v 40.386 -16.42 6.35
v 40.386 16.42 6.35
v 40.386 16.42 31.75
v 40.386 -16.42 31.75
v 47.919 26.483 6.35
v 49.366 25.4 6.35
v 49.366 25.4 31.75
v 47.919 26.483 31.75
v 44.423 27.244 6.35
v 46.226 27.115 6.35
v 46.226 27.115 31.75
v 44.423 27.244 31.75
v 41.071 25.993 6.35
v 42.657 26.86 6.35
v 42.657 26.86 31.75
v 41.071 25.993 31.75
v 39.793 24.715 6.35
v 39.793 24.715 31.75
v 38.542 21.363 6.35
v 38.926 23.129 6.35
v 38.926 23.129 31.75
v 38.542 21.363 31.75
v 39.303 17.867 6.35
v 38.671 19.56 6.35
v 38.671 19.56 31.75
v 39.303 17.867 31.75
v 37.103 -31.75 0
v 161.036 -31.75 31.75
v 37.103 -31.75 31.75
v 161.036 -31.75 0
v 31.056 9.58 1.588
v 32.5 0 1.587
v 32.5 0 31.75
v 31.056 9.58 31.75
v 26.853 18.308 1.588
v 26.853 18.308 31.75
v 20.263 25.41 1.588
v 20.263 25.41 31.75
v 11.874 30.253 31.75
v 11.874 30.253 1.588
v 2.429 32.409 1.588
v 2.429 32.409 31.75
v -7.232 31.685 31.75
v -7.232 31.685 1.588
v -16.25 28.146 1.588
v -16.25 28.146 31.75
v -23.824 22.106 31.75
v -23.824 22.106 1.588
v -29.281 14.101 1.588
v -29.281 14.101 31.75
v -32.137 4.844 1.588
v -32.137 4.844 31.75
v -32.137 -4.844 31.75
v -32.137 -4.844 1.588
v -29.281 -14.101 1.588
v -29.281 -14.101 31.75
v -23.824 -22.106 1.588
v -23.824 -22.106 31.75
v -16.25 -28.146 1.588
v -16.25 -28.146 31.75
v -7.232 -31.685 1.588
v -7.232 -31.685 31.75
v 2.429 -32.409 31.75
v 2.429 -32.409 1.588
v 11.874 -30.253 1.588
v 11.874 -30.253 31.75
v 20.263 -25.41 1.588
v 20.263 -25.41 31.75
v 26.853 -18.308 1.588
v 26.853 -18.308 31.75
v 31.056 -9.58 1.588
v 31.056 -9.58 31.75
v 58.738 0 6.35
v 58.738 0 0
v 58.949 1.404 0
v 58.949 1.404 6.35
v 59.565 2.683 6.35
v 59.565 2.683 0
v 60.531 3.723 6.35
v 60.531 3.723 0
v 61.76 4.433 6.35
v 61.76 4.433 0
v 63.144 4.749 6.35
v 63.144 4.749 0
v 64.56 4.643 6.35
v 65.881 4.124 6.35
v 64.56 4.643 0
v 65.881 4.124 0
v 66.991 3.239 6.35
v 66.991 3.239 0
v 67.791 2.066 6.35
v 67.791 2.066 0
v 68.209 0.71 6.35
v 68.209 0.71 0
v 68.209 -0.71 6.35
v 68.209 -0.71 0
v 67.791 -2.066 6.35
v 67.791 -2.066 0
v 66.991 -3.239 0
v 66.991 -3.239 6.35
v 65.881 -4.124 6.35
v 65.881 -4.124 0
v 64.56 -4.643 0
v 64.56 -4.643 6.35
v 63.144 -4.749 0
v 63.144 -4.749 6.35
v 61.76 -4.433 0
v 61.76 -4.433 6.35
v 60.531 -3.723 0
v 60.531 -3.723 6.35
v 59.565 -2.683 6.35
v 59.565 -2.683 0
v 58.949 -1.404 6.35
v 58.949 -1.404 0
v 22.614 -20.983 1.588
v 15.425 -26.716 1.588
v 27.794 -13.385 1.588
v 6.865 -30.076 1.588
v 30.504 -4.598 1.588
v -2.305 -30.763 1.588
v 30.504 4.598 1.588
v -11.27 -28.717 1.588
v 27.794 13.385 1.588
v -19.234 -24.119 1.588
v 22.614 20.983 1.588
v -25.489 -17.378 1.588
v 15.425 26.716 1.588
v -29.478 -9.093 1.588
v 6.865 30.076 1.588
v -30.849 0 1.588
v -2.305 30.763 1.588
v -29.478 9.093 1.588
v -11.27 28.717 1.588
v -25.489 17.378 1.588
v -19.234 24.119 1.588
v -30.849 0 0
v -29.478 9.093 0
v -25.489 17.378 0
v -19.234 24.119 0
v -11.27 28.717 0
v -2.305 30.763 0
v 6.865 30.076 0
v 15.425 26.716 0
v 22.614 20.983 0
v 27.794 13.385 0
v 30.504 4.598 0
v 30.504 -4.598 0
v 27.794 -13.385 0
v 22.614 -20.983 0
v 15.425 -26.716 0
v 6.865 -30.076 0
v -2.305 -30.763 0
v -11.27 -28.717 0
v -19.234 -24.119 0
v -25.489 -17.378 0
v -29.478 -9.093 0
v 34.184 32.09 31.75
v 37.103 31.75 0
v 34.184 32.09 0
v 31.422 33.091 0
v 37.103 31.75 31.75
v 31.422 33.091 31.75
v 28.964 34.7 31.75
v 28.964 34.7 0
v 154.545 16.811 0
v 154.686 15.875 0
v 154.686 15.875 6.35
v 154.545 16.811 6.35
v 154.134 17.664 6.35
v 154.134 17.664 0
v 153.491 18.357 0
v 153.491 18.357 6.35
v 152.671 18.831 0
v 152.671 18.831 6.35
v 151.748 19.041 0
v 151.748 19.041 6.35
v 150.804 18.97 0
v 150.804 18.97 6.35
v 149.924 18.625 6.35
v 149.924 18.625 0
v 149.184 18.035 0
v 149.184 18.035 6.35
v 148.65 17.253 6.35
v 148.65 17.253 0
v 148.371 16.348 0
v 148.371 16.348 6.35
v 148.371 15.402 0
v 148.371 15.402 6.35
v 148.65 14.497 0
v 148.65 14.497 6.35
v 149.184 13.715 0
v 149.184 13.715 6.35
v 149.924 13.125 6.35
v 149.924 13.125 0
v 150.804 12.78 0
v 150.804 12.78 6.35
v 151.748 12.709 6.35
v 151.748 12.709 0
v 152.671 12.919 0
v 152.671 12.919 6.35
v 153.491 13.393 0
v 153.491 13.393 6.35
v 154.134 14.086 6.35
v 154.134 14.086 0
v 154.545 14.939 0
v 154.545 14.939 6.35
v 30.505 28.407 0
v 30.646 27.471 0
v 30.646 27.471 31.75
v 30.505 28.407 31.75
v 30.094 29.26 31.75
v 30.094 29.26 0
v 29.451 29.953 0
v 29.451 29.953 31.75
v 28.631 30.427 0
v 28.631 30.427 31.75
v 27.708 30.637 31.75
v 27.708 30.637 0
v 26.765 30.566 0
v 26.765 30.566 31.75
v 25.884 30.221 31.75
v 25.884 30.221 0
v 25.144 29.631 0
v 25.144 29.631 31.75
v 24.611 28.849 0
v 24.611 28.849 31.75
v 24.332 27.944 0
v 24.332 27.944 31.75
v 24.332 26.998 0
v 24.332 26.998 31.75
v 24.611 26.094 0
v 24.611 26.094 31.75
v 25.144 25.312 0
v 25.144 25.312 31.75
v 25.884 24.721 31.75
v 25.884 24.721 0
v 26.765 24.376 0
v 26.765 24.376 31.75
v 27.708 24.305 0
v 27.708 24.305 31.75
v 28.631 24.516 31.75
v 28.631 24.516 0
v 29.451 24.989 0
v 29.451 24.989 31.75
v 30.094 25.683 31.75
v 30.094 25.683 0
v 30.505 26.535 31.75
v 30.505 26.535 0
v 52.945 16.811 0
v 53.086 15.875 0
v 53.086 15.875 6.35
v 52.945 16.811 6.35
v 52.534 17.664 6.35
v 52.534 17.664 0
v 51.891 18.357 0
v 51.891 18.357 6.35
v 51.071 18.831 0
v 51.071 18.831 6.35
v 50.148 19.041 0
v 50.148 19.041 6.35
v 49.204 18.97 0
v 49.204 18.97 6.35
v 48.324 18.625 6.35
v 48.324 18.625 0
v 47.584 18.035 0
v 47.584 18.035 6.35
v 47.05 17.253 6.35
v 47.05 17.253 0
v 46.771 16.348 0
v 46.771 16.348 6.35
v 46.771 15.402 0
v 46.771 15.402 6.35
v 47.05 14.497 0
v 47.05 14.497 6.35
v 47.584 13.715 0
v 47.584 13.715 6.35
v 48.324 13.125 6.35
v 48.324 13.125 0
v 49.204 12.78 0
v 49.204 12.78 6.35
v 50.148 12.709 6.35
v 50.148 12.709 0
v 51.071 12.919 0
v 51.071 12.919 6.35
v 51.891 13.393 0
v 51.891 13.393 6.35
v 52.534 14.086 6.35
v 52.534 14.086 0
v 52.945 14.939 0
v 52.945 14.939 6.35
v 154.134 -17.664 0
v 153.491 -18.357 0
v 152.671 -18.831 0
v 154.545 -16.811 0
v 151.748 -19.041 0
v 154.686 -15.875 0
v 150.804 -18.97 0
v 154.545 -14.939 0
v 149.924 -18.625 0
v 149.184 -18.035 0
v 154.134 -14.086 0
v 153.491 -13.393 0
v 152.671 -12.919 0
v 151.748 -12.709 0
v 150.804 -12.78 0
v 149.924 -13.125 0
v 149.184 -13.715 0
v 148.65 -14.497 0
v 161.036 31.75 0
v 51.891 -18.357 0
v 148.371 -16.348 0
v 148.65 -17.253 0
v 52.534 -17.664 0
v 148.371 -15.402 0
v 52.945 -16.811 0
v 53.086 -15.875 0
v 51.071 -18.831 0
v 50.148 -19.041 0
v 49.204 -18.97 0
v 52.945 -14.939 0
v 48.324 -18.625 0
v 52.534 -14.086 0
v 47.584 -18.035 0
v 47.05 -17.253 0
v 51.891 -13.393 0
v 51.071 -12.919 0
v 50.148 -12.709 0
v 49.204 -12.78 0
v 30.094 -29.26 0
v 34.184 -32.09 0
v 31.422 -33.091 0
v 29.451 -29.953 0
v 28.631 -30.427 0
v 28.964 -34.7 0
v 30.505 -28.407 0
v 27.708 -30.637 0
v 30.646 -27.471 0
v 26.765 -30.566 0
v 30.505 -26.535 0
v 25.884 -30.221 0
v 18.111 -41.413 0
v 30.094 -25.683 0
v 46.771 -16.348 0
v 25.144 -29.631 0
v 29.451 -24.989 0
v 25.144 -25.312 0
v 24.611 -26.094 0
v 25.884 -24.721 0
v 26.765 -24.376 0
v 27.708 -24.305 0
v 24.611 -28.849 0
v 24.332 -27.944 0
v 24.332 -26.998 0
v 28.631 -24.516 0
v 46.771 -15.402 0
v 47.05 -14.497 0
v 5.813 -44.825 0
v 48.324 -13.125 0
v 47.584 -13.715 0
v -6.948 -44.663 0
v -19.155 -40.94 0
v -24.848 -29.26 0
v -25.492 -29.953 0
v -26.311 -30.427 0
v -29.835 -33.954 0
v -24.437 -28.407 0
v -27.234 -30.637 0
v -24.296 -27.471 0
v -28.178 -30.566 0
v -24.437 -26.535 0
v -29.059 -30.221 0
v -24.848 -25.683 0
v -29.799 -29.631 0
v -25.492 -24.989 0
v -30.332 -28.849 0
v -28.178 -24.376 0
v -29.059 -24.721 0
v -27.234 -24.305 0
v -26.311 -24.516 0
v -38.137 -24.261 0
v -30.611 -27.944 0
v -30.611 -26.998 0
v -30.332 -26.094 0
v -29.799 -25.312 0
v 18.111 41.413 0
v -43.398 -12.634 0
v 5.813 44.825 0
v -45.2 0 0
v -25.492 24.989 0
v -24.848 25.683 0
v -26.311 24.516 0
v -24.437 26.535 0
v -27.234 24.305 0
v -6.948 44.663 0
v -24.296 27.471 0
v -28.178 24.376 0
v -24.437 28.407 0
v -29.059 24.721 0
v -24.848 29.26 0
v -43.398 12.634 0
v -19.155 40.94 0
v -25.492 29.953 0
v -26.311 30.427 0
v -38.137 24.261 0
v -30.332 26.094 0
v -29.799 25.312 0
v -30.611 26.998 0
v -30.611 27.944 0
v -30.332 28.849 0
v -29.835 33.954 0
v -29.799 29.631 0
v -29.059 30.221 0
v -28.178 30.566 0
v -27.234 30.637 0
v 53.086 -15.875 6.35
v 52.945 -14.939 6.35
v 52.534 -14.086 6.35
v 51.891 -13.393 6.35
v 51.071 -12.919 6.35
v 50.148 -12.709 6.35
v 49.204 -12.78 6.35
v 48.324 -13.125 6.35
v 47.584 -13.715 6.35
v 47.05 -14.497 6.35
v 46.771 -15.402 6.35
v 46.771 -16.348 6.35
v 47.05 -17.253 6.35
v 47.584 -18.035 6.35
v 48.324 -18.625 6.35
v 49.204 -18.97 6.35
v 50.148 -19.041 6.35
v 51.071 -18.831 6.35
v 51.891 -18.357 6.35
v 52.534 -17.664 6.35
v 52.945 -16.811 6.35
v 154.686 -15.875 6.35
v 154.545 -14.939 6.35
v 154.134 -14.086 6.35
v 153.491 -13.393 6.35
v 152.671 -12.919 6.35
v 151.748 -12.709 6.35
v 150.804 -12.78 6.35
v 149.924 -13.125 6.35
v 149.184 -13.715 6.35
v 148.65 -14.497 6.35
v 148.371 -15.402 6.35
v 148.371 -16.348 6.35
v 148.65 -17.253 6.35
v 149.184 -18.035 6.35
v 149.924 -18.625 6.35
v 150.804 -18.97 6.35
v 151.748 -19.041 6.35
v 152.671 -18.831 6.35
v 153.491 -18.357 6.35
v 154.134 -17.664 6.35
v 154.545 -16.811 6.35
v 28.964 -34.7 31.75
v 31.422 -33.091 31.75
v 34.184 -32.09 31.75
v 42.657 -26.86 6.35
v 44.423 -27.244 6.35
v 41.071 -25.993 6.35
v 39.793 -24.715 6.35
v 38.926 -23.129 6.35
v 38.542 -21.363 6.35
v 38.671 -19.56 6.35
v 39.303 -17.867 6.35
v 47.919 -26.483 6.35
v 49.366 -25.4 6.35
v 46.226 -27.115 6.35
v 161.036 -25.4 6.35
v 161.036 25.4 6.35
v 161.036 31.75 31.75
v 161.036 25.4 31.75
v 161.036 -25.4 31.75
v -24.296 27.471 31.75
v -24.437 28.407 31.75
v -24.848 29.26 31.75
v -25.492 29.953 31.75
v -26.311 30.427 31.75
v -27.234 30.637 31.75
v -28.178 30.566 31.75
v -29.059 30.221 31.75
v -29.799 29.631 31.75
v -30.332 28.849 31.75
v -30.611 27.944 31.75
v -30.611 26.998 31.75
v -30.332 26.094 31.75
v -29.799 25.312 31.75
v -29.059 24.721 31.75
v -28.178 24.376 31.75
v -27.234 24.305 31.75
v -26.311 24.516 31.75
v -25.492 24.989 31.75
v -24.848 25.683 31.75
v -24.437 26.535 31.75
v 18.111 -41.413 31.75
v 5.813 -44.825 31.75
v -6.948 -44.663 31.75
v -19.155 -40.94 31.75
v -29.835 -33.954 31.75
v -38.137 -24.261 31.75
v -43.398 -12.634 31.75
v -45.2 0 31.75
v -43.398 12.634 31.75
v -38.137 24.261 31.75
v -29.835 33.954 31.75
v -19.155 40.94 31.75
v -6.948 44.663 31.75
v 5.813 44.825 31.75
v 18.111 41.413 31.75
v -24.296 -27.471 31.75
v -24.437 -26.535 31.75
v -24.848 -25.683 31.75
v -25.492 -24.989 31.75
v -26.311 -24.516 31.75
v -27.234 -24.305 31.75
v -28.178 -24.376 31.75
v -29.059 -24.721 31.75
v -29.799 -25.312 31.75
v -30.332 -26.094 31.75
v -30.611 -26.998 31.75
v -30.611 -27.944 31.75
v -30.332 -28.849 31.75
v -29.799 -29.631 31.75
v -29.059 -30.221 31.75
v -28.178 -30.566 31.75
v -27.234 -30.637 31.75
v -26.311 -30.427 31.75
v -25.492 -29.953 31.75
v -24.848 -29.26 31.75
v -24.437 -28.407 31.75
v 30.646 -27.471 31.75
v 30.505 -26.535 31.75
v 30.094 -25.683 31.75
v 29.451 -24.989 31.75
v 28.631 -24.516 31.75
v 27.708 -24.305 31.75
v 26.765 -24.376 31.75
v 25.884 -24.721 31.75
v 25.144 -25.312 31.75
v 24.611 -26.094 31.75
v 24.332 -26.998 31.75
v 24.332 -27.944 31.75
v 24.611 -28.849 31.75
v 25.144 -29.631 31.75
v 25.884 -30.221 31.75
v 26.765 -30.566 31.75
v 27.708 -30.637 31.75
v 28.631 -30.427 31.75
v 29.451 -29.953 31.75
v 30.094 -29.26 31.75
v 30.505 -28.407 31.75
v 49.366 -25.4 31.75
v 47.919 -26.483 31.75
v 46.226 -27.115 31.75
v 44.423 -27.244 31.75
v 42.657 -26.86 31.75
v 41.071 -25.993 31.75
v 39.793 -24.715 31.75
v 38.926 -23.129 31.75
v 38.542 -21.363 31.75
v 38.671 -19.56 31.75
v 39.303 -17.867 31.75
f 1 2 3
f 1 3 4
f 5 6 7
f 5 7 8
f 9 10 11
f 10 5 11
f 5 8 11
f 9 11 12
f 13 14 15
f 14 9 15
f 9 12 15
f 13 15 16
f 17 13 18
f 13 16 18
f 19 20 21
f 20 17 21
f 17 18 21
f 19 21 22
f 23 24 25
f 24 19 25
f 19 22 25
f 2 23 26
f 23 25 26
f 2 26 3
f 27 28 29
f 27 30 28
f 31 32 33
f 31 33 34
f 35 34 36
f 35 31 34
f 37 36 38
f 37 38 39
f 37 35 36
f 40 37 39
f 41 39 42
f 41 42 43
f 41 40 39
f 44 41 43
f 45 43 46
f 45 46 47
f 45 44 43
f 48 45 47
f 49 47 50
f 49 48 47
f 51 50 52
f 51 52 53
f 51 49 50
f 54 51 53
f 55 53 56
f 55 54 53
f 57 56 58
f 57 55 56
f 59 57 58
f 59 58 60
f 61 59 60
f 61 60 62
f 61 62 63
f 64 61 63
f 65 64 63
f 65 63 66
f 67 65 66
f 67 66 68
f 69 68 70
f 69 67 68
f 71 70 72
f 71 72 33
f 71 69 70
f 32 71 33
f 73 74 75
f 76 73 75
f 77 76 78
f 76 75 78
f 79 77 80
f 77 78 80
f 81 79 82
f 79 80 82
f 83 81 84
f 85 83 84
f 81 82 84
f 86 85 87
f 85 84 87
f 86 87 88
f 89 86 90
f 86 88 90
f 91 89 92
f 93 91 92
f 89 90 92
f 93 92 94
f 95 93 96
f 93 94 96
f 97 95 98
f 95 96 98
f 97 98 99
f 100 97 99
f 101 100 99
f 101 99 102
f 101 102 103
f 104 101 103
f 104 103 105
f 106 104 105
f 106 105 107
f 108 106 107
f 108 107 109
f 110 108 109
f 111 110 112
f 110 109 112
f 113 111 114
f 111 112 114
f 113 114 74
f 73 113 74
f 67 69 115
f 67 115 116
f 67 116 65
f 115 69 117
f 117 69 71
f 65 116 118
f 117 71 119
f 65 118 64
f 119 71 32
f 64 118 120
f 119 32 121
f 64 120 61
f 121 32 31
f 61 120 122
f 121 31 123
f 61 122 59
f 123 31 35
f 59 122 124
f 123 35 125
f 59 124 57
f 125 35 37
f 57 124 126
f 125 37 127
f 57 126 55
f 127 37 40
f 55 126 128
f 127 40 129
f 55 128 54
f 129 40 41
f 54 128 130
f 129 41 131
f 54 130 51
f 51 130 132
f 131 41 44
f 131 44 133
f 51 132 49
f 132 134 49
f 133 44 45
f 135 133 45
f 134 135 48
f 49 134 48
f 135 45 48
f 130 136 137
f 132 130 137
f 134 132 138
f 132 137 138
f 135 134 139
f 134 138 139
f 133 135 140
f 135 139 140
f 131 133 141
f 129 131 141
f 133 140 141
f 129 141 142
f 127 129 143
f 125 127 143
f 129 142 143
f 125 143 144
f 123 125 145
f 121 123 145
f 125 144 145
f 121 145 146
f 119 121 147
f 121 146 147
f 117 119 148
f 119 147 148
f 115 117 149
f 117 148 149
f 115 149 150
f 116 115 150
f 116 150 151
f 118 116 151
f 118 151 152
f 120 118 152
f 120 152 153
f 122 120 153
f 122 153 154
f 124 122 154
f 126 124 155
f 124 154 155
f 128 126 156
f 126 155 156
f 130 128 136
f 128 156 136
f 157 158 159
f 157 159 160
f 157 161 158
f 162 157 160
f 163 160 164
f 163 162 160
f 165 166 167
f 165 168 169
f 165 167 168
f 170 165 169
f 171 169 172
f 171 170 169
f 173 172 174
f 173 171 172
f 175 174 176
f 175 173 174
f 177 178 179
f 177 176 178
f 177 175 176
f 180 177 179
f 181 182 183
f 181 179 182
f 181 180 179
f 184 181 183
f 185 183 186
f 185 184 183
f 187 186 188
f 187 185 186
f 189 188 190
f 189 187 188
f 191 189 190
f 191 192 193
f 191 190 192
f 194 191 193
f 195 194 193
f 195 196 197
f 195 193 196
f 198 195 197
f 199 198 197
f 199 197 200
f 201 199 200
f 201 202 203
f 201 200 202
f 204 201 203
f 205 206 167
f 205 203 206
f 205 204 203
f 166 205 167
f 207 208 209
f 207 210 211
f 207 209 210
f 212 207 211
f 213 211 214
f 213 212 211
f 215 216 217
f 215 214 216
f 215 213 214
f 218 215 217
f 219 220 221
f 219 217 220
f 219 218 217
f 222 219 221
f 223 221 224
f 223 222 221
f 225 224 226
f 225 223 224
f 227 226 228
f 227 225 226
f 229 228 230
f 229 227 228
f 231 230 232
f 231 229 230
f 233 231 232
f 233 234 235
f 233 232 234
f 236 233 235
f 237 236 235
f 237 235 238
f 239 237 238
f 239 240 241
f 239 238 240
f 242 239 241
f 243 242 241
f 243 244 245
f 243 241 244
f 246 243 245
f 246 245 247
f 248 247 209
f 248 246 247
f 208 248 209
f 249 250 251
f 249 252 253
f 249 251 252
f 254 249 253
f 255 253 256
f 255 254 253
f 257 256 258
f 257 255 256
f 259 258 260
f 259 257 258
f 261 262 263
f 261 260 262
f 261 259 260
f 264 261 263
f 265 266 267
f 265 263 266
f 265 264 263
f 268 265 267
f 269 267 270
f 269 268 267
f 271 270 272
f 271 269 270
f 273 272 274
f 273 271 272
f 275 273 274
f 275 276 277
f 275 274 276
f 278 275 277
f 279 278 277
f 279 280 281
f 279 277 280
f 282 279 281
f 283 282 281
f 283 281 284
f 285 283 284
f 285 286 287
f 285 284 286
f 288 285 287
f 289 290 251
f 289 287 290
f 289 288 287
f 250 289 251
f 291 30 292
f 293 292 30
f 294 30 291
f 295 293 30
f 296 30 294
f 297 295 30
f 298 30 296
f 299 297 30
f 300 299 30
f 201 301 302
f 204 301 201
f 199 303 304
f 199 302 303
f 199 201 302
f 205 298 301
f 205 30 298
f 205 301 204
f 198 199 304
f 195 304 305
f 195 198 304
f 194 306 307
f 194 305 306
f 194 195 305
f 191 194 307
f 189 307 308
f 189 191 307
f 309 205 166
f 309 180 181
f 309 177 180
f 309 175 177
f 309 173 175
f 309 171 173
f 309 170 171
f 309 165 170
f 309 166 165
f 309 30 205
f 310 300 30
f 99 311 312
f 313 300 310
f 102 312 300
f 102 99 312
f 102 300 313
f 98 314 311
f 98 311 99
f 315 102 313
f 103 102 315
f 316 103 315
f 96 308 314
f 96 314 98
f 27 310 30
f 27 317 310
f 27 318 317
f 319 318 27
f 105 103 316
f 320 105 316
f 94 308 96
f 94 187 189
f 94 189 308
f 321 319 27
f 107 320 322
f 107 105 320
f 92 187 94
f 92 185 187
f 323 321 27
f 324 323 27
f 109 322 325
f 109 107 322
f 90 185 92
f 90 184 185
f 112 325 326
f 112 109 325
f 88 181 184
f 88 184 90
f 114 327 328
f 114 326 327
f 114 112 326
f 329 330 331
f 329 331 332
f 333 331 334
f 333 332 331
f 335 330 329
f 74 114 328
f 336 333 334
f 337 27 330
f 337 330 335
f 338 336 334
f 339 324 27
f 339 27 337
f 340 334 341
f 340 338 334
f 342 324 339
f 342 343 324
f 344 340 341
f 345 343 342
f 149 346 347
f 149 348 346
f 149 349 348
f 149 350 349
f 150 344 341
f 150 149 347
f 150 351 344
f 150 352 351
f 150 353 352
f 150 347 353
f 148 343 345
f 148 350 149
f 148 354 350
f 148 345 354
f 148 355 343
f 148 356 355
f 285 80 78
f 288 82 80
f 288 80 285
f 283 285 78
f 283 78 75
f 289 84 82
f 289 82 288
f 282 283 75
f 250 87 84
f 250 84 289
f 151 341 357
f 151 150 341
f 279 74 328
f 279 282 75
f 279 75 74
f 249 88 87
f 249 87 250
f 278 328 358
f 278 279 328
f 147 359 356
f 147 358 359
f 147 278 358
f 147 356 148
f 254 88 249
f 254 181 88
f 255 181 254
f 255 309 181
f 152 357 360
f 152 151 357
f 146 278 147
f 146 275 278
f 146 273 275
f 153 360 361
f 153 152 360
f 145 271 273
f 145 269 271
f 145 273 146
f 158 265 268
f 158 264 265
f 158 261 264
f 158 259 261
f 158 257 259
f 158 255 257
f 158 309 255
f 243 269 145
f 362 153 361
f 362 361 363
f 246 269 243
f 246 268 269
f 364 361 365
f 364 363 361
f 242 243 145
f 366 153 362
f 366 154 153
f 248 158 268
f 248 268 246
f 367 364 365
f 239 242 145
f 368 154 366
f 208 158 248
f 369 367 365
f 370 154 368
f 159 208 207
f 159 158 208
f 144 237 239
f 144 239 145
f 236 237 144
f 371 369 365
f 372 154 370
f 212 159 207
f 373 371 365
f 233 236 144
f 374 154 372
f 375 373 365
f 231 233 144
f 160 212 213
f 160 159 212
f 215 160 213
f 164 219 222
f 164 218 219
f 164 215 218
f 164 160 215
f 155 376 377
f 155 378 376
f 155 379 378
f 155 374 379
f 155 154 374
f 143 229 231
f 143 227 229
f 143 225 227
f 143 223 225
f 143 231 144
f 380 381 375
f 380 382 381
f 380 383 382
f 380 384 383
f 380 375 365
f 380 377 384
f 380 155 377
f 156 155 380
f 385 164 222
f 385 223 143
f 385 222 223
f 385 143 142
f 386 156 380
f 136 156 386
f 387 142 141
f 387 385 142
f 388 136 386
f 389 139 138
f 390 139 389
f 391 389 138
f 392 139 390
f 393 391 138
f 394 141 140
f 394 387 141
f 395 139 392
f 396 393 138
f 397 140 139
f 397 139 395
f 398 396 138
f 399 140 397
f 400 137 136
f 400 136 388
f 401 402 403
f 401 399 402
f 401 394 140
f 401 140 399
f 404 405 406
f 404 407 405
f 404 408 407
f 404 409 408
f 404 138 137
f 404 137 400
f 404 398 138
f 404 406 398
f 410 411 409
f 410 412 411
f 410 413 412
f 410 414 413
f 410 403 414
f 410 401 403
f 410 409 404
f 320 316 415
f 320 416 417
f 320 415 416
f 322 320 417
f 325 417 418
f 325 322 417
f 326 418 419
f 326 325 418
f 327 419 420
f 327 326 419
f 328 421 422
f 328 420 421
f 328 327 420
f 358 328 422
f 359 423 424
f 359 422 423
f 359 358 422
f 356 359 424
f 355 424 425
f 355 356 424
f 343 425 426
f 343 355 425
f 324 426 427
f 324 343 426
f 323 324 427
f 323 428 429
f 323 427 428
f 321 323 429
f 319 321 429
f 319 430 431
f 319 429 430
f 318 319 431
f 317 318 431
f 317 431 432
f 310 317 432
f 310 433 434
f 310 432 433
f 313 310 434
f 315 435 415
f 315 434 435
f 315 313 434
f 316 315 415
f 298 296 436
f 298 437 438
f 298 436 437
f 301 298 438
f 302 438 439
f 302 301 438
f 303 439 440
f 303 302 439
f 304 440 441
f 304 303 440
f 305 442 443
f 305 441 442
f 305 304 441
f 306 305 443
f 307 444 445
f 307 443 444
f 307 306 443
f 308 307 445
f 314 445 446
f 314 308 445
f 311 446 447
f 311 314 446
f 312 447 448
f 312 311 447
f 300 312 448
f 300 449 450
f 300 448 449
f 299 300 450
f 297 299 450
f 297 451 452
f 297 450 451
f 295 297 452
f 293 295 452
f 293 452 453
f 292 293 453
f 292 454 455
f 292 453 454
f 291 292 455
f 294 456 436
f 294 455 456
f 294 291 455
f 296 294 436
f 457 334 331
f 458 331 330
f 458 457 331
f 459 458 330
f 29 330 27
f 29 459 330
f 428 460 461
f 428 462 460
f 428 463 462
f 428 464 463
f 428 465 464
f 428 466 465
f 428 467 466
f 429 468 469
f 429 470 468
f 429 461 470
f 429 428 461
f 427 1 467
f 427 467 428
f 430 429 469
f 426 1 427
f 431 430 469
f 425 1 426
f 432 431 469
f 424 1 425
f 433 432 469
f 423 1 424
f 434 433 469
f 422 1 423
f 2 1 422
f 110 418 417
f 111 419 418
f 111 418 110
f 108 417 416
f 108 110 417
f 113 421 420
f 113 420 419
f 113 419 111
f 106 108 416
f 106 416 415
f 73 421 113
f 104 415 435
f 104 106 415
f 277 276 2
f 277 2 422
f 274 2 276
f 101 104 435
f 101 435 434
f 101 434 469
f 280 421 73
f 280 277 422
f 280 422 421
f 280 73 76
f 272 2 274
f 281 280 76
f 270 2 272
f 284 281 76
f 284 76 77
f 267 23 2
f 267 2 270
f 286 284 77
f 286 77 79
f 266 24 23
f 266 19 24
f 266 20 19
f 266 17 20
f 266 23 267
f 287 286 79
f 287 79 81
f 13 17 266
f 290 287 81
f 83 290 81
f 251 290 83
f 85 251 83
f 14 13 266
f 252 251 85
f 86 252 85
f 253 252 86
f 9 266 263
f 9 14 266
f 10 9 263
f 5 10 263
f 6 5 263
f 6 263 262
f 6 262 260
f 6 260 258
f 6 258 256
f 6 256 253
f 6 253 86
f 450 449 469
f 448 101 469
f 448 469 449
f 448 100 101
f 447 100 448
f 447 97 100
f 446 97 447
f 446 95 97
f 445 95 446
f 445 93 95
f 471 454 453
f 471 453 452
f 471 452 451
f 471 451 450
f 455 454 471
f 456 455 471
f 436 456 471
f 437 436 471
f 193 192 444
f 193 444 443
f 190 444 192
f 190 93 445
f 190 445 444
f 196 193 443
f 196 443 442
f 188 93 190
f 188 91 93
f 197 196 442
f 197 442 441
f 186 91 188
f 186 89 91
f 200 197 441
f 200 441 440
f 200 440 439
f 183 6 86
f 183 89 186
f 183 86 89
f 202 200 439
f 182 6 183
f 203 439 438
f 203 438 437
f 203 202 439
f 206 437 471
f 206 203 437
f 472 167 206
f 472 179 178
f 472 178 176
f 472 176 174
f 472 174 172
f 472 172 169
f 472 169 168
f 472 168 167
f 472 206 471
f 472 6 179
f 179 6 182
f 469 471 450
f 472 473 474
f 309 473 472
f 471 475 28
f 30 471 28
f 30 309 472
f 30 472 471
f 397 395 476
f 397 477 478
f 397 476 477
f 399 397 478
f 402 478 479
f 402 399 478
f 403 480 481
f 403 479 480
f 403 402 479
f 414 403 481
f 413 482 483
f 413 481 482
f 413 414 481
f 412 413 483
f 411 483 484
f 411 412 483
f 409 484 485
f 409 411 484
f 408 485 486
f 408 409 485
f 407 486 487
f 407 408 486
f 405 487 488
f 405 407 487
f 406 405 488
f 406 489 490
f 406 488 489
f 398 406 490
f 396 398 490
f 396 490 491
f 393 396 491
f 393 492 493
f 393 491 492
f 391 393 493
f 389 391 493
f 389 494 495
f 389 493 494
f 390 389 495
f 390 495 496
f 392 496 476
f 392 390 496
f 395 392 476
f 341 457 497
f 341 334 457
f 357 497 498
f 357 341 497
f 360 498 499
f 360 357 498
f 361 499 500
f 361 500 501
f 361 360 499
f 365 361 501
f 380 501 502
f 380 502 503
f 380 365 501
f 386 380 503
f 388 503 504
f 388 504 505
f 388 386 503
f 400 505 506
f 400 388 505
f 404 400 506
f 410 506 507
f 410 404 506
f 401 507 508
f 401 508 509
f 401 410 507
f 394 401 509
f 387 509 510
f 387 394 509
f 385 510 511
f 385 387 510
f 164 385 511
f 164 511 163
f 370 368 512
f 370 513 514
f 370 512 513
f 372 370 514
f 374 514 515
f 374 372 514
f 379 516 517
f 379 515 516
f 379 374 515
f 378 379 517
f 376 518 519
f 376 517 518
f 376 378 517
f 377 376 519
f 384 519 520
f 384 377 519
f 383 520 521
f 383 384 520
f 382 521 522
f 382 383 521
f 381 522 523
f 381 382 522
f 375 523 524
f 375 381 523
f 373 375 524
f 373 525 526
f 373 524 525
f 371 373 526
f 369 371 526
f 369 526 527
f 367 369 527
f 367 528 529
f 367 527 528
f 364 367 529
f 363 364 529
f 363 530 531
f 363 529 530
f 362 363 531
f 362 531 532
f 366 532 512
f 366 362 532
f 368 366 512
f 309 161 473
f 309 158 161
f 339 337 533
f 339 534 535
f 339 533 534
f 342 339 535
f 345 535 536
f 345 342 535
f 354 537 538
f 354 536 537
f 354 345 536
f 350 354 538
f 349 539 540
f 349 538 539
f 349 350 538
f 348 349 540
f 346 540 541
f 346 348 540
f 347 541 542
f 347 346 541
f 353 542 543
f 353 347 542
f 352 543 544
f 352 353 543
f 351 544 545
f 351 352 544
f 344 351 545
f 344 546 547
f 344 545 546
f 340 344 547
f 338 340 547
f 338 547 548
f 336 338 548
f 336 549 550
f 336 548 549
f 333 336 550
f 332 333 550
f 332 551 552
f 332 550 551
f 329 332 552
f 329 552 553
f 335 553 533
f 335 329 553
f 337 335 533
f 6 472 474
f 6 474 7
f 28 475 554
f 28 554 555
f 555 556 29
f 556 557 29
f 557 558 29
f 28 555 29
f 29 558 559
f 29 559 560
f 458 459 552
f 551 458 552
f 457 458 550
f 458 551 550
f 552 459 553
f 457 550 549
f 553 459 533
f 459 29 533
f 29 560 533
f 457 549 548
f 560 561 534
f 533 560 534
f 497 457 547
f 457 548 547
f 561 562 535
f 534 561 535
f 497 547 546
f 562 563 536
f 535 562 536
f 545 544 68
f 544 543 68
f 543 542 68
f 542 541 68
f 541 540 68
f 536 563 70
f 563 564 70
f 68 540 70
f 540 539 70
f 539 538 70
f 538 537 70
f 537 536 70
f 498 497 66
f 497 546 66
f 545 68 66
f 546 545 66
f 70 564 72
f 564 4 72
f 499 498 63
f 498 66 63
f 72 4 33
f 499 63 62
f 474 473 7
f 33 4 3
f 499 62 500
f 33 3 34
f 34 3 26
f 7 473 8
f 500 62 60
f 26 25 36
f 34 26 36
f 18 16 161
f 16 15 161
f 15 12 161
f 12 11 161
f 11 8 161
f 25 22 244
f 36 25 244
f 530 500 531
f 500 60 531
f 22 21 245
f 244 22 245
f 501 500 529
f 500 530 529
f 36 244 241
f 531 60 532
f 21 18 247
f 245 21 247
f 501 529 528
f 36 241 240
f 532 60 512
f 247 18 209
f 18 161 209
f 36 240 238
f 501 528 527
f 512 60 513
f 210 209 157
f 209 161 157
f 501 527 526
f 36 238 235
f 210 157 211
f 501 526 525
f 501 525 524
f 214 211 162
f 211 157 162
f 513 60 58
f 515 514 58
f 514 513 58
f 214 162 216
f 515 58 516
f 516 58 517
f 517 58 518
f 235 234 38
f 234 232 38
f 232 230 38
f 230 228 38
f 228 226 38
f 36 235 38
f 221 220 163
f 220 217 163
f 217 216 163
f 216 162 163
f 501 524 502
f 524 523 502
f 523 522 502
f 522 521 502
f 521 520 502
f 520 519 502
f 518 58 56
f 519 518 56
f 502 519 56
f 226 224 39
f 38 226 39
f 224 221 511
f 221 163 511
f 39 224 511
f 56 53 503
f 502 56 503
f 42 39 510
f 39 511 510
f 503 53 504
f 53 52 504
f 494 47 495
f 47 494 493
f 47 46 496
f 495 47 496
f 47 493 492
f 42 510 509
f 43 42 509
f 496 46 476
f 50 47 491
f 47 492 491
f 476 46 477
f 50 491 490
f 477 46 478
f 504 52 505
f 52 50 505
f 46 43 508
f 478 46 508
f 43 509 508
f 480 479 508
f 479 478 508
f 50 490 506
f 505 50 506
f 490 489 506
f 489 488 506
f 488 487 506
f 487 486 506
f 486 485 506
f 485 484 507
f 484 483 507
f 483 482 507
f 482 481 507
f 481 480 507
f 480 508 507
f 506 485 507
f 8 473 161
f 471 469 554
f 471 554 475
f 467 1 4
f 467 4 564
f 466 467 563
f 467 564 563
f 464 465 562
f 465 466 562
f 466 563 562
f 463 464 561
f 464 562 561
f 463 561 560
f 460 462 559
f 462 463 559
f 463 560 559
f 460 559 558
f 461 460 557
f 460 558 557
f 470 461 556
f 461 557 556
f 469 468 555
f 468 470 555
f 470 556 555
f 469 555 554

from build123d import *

# Parameters (mm, degrees)
SKETCH1_R               = 32.5
SKETCH1_W               = 120.65
SKETCH1_H               = 50.8
BOSS_EXTRUDE2_DEPTH     = 6.35
BOSS_EXTRUDE3_START     = 6.35
SKETCH1_3_R             = 32.5
BOSS_EXTRUDE3_DEPTH     = 25.4
CUT_EXTRUDE1_DEPTH      = 170.176810751
CUT_EXTRUDE1_DEPTH_BACK = 170.176810751
SKETCH2_R               = 3.175
SKETCH3_R               = 6.35
CUT_EXTRUDE2_DEPTH      = 25.4
SKETCH4_3_R             = 4.7625
CUT_EXTRUDE3_DEPTH      = 6.35
FILLET1_R               = 12.7
SKETCH5_R               = 32.5
SKETCH5_R_2             = 30.849
BOSS_EXTRUDE6_DEPTH     = 1.5875


with BuildPart() as part:
    # Sketch1 → Boss-Extrude2 (new body)
    # profile 1 of 2: a face of its own
    with BuildSketch(Plane.XY):
        with BuildLine():
            Line((32.171066193, 31.75), (161.036, 31.75))
            Line((161.036, 31.75), (161.036, 25.4))
            Line((161.036, 25.4), (40.386, 25.4))
            Line((40.386, 25.4), (40.386, -25.4))
            Line((40.386, -25.4), (161.036, -25.4))
            Line((161.036, -25.4), (161.036, -31.75))
            Line((161.036, -31.75), (32.171066193, -31.75))
            ThreePointArc((32.171066193, -31.75), (-45.2, 0), (32.171066193, 31.75))
        make_face()
        Circle(SKETCH1_R, mode=Mode.SUBTRACT)
    # profile 2 of 2: a face of its own
    with BuildSketch(Plane.XY):
        with Locations((100.711, 0)):
            Rectangle(SKETCH1_W, SKETCH1_H)
    extrude(amount=BOSS_EXTRUDE2_DEPTH)

    # Sketch1<3> → Boss-Extrude3 (add)
    with BuildSketch(Plane.XY.offset(BOSS_EXTRUDE3_START)):
        with BuildLine():
            Line((32.171066193, 31.75), (161.036, 31.75))
            Line((161.036, 31.75), (161.036, 25.4))
            Line((161.036, 25.4), (40.386, 25.4))
            Line((40.386, 25.4), (40.386, -25.4))
            Line((40.386, -25.4), (161.036, -25.4))
            Line((161.036, -25.4), (161.036, -31.75))
            Line((161.036, -31.75), (32.171066193, -31.75))
            ThreePointArc((32.171066193, -31.75), (-45.2, 0), (32.171066193, 31.75))
        make_face()
        Circle(SKETCH1_3_R, mode=Mode.SUBTRACT)
    extrude(amount=BOSS_EXTRUDE3_DEPTH)

    # Sketch2 → Cut-Extrude1 (cut, two sides: drawn at the far end of the back side and taken through both)
    with BuildSketch(Plane.XY.offset(6.35).offset(-CUT_EXTRUDE1_DEPTH_BACK)):
        with Locations((49.911, 15.875)):
            Circle(SKETCH2_R)
        with Locations((151.511, 15.875)):
            Circle(SKETCH2_R)
        with Locations((151.511, -15.875)):
            Circle(SKETCH2_R)
        with Locations((49.911, -15.875)):
            Circle(SKETCH2_R)
        with Locations((27.471098449, 27.471098449)):
            Circle(SKETCH2_R)
        with Locations((27.471098449, -27.471098449)):
            Circle(SKETCH2_R)
        with Locations((-27.471098449, -27.471098449)):
            Circle(SKETCH2_R)
        with Locations((-27.471098449, 27.471098449)):
            Circle(SKETCH2_R)
    extrude(amount=CUT_EXTRUDE1_DEPTH + CUT_EXTRUDE1_DEPTH_BACK, mode=Mode.SUBTRACT)

    # Sketch3 → Cut-Extrude2 (cut)
    with BuildSketch(Plane.XY.offset(31.75)):
        with Locations((44.876128061, 20.909871939)):
            Circle(SKETCH3_R)
        with Locations((44.876128061, -20.909871939)):
            Circle(SKETCH3_R)
    extrude(amount=-CUT_EXTRUDE2_DEPTH, mode=Mode.SUBTRACT)

    # Sketch4<3> → Cut-Extrude3 (cut)
    with BuildSketch(Plane(origin=(0, 0, 0), x_dir=(-1, 0, 0), z_dir=(0, 0, -1))):
        with Locations((-63.5, 0)):
            Circle(SKETCH4_3_R)
    extrude(amount=-CUT_EXTRUDE3_DEPTH, mode=Mode.SUBTRACT)

    # Fillet1
    fillet1_edges = [part.edges().sort_by_distance(p)[0] for p in [
        (32.171066193, -31.75, 15.875),
        (32.171066193, 31.75, 15.875),
    ]]
    fillet(fillet1_edges, radius=FILLET1_R)

    # Sketch5 → Boss-Extrude6 (add)
    with BuildSketch(Plane(origin=(0, 0, 0), x_dir=(-1, 0, 0), z_dir=(0, 0, -1))):
        Circle(SKETCH5_R)
        Circle(SKETCH5_R_2, mode=Mode.SUBTRACT)
    extrude(amount=-BOSS_EXTRUDE6_DEPTH)


solid = part.part
